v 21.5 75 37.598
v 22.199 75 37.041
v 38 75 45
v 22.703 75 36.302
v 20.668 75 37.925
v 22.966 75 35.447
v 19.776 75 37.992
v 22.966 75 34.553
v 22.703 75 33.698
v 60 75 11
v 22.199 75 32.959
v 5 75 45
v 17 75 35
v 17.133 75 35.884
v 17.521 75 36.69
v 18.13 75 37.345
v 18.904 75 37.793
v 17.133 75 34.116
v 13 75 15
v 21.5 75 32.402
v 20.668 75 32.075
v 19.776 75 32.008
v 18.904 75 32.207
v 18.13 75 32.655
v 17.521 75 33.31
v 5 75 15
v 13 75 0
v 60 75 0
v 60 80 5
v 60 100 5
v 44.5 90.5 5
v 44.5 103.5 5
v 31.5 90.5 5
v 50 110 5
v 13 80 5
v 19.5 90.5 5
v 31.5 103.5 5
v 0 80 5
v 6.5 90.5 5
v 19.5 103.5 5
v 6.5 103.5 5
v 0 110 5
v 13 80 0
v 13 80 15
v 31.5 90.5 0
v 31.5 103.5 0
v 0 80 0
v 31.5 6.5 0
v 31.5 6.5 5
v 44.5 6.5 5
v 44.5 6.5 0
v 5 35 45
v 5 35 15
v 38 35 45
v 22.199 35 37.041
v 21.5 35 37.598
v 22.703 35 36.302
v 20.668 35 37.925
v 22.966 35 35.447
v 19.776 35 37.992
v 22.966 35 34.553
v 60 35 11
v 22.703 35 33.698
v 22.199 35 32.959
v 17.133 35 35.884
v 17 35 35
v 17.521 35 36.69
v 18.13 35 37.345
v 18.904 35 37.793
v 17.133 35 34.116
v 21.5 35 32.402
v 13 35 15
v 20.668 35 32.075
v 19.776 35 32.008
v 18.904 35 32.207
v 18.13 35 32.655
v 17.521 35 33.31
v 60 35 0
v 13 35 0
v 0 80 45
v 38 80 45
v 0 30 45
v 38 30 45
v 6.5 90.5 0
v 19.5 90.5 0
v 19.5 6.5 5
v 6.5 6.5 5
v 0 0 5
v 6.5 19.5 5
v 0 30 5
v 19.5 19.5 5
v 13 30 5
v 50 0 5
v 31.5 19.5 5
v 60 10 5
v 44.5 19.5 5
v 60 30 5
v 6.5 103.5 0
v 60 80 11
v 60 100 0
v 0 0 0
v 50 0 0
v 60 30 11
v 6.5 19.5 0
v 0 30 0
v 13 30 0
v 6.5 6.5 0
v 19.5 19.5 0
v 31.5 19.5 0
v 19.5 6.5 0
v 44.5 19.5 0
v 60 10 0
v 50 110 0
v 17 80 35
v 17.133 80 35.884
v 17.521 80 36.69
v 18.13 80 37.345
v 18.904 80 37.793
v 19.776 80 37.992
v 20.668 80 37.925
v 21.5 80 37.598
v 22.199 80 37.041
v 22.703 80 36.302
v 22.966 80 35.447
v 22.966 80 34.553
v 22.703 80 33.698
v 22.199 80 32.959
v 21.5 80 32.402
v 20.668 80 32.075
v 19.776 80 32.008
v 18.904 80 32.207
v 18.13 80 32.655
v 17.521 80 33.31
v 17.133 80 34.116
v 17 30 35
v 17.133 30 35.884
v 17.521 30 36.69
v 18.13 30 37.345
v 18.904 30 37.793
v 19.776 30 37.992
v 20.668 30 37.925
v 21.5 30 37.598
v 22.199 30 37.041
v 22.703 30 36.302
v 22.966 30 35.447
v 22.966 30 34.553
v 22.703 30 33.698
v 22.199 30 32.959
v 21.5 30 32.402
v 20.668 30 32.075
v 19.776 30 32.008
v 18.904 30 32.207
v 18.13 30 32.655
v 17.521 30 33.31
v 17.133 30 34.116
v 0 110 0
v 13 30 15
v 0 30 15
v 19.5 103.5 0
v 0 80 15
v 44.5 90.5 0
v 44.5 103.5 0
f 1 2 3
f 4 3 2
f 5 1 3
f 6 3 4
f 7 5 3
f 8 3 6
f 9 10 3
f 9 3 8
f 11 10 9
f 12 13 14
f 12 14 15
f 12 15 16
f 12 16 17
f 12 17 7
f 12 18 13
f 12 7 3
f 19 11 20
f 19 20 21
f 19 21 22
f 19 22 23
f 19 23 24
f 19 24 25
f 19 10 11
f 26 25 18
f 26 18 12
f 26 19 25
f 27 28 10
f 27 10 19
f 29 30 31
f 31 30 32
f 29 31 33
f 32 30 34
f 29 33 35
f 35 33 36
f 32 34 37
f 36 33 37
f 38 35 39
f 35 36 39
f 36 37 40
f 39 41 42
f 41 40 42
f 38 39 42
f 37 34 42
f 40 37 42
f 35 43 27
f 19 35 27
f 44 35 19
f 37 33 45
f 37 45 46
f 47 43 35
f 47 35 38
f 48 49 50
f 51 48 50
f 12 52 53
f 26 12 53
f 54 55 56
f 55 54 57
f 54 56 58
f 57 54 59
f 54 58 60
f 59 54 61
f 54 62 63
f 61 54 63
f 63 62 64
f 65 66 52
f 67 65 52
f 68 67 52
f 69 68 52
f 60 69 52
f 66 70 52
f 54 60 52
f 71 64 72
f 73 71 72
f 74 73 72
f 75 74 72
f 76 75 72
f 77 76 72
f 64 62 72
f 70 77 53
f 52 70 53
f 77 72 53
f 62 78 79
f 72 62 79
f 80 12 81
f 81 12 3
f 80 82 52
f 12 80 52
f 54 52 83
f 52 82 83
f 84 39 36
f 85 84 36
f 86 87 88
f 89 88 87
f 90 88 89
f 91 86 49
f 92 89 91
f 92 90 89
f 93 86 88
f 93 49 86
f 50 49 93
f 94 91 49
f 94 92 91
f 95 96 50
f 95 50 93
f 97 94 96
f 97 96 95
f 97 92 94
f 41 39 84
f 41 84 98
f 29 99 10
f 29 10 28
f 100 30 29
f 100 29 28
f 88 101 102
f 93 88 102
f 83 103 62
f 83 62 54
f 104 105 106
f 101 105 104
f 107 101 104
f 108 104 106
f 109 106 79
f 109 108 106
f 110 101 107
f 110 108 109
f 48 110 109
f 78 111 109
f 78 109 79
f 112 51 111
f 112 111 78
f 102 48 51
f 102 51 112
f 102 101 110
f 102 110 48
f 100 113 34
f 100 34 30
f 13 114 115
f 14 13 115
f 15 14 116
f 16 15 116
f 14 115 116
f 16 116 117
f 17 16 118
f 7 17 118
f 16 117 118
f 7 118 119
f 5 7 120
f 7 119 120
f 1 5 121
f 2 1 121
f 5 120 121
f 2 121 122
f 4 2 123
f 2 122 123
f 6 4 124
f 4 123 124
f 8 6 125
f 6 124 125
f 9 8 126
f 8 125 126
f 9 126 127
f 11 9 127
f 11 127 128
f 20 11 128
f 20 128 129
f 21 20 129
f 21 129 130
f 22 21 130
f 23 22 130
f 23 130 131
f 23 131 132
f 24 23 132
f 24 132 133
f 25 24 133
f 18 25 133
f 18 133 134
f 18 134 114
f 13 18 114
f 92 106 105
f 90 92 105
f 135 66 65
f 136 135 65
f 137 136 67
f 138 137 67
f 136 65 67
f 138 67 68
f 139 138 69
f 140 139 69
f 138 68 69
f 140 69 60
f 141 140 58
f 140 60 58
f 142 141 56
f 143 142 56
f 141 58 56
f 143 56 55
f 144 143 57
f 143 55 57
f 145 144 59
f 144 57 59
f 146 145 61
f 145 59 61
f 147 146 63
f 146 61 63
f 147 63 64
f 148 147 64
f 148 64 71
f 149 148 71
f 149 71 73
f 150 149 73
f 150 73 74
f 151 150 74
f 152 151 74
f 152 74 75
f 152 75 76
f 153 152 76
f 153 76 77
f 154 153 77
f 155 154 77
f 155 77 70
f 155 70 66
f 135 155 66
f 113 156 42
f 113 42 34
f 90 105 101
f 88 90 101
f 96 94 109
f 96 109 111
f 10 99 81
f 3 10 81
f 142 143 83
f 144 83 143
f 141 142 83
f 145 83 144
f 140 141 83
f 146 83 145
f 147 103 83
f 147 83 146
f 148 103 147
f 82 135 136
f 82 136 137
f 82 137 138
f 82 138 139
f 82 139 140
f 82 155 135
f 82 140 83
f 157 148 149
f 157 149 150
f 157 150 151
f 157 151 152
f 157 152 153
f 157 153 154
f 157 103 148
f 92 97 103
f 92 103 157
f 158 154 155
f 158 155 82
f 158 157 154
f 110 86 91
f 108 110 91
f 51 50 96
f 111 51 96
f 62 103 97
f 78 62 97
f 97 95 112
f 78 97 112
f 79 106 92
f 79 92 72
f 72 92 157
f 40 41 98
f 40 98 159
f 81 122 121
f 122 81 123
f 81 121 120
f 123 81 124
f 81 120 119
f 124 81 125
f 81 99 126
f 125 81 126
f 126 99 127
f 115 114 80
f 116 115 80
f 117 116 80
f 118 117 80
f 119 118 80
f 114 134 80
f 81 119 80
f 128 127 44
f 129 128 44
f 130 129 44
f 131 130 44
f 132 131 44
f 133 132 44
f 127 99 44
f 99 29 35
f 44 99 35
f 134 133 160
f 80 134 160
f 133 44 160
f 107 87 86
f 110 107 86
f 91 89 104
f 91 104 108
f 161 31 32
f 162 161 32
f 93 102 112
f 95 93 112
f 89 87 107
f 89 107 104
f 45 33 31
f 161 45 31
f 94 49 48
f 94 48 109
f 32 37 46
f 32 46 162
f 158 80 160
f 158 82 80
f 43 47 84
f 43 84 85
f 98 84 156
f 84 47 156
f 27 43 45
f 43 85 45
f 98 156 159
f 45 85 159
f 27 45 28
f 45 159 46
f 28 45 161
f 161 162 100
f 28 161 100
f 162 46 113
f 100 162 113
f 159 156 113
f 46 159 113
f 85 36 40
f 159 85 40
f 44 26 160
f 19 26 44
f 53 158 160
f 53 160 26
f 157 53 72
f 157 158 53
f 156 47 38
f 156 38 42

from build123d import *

# Parameters (mm, degrees)
BOSS_EXTRUDE4_DEPTH   = 5
BOSS_EXTRUDE4_2_DEPTH = 5
SKETCH3_W             = 13
SKETCH3_H             = 13
CUT_EXTRUDE2_DEPTH    = 126.39936204
BOSS_EXTRUDE5_DEPTH   = 5
BOSS_EXTRUDE6_START   = 50
BOSS_EXTRUDE6_DEPTH   = 5
SKETCH5_W             = 5
SKETCH5_H             = 30
BOSS_EXTRUDE7_DEPTH   = 40
SKETCH6_R             = 3
CUT_EXTRUDE3_DEPTH    = 110.658560997


with BuildPart() as part:
    # Sketch1 → Boss-Extrude4 (new body)
    with BuildSketch(Plane.XY):
        Polygon((0, 0), (50, 0), (60, 10), (60, 30), (0, 30), align=None)
    extrude(amount=BOSS_EXTRUDE4_DEPTH)


with BuildPart() as body_2:
    # Sketch1 → Boss-Extrude4 2 (new body)
    with BuildSketch(Plane.XY):
        Polygon((0, 80), (0, 110), (50, 110), (60, 100), (60, 80), align=None)
    extrude(amount=BOSS_EXTRUDE4_2_DEPTH)


with BuildPart() as cut_extrude2_tool:
    # Sketch3 → Cut-Extrude2 (new, through all)
    with BuildSketch(Plane.XY.offset(5)):
        with Locations((13, 97)):
            Rectangle(SKETCH3_W, SKETCH3_H)
        with Locations((38, 97)):
            Rectangle(SKETCH3_W, SKETCH3_H)
        with Locations((13, 13)):
            Rectangle(SKETCH3_W, SKETCH3_H)
        with Locations((38, 13)):
            Rectangle(SKETCH3_W, SKETCH3_H)
    extrude(amount=-CUT_EXTRUDE2_DEPTH)


with BuildPart() as part_1:
    add(part.part)

    # Cut-Extrude2: cut by cut_extrude2_tool
    add(cut_extrude2_tool.part, mode=Mode.SUBTRACT)

    # Sketch4 → Boss-Extrude5 (add)
    with BuildSketch(Plane(origin=(0, 30, 0), x_dir=(1, 0, 0), z_dir=(0, 1, 0))):
        Polygon((60, -5), (60, -11), (38, -45), (0, -45), (0, -15), (13, -15), (13, -5), (13, 0), (60, 0), align=None)
    extrude(amount=BOSS_EXTRUDE5_DEPTH)



with BuildPart() as body_2_1:
    add(body_2.part)

    # Cut-Extrude2: cut by cut_extrude2_tool
    add(cut_extrude2_tool.part, mode=Mode.SUBTRACT)

    # Sketch4<2> → Boss-Extrude6 (add)
    with BuildSketch(Plane(origin=(0, 30, 0), x_dir=(1, 0, 0), z_dir=(0, 1, 0)).offset(BOSS_EXTRUDE6_START)):
        Polygon((60, -5), (60, -11), (38, -45), (0, -45), (0, -15), (13, -15), (13, -5), (13, 0), (60, 0), align=None)
    extrude(amount=-BOSS_EXTRUDE6_DEPTH)


with BuildPart() as part_2:
    add(part_1.part)

    add(body_2_1.part)  # Boss-Extrude7 merges body 2
    # Sketch5 → Boss-Extrude7 (add)
    with BuildSketch(Plane(origin=(0, 35, 0), x_dir=(1, 0, 0), z_dir=(0, 1, 0))):
        with Locations((2.5, -30)):
            Rectangle(SKETCH5_W, SKETCH5_H)
    extrude(amount=BOSS_EXTRUDE7_DEPTH)

    # Sketch6 → Cut-Extrude3 (cut, through all)
    with BuildSketch(Plane(origin=(0, 80, 0), x_dir=(1, 0, 0), z_dir=(0, 1, 0))):
        with Locations(Location((20, -35, 0), (0, 0, 180))):
            Circle(SKETCH6_R)
    extrude(amount=-CUT_EXTRUDE3_DEPTH, mode=Mode.SUBTRACT)


solid = part_2.part
